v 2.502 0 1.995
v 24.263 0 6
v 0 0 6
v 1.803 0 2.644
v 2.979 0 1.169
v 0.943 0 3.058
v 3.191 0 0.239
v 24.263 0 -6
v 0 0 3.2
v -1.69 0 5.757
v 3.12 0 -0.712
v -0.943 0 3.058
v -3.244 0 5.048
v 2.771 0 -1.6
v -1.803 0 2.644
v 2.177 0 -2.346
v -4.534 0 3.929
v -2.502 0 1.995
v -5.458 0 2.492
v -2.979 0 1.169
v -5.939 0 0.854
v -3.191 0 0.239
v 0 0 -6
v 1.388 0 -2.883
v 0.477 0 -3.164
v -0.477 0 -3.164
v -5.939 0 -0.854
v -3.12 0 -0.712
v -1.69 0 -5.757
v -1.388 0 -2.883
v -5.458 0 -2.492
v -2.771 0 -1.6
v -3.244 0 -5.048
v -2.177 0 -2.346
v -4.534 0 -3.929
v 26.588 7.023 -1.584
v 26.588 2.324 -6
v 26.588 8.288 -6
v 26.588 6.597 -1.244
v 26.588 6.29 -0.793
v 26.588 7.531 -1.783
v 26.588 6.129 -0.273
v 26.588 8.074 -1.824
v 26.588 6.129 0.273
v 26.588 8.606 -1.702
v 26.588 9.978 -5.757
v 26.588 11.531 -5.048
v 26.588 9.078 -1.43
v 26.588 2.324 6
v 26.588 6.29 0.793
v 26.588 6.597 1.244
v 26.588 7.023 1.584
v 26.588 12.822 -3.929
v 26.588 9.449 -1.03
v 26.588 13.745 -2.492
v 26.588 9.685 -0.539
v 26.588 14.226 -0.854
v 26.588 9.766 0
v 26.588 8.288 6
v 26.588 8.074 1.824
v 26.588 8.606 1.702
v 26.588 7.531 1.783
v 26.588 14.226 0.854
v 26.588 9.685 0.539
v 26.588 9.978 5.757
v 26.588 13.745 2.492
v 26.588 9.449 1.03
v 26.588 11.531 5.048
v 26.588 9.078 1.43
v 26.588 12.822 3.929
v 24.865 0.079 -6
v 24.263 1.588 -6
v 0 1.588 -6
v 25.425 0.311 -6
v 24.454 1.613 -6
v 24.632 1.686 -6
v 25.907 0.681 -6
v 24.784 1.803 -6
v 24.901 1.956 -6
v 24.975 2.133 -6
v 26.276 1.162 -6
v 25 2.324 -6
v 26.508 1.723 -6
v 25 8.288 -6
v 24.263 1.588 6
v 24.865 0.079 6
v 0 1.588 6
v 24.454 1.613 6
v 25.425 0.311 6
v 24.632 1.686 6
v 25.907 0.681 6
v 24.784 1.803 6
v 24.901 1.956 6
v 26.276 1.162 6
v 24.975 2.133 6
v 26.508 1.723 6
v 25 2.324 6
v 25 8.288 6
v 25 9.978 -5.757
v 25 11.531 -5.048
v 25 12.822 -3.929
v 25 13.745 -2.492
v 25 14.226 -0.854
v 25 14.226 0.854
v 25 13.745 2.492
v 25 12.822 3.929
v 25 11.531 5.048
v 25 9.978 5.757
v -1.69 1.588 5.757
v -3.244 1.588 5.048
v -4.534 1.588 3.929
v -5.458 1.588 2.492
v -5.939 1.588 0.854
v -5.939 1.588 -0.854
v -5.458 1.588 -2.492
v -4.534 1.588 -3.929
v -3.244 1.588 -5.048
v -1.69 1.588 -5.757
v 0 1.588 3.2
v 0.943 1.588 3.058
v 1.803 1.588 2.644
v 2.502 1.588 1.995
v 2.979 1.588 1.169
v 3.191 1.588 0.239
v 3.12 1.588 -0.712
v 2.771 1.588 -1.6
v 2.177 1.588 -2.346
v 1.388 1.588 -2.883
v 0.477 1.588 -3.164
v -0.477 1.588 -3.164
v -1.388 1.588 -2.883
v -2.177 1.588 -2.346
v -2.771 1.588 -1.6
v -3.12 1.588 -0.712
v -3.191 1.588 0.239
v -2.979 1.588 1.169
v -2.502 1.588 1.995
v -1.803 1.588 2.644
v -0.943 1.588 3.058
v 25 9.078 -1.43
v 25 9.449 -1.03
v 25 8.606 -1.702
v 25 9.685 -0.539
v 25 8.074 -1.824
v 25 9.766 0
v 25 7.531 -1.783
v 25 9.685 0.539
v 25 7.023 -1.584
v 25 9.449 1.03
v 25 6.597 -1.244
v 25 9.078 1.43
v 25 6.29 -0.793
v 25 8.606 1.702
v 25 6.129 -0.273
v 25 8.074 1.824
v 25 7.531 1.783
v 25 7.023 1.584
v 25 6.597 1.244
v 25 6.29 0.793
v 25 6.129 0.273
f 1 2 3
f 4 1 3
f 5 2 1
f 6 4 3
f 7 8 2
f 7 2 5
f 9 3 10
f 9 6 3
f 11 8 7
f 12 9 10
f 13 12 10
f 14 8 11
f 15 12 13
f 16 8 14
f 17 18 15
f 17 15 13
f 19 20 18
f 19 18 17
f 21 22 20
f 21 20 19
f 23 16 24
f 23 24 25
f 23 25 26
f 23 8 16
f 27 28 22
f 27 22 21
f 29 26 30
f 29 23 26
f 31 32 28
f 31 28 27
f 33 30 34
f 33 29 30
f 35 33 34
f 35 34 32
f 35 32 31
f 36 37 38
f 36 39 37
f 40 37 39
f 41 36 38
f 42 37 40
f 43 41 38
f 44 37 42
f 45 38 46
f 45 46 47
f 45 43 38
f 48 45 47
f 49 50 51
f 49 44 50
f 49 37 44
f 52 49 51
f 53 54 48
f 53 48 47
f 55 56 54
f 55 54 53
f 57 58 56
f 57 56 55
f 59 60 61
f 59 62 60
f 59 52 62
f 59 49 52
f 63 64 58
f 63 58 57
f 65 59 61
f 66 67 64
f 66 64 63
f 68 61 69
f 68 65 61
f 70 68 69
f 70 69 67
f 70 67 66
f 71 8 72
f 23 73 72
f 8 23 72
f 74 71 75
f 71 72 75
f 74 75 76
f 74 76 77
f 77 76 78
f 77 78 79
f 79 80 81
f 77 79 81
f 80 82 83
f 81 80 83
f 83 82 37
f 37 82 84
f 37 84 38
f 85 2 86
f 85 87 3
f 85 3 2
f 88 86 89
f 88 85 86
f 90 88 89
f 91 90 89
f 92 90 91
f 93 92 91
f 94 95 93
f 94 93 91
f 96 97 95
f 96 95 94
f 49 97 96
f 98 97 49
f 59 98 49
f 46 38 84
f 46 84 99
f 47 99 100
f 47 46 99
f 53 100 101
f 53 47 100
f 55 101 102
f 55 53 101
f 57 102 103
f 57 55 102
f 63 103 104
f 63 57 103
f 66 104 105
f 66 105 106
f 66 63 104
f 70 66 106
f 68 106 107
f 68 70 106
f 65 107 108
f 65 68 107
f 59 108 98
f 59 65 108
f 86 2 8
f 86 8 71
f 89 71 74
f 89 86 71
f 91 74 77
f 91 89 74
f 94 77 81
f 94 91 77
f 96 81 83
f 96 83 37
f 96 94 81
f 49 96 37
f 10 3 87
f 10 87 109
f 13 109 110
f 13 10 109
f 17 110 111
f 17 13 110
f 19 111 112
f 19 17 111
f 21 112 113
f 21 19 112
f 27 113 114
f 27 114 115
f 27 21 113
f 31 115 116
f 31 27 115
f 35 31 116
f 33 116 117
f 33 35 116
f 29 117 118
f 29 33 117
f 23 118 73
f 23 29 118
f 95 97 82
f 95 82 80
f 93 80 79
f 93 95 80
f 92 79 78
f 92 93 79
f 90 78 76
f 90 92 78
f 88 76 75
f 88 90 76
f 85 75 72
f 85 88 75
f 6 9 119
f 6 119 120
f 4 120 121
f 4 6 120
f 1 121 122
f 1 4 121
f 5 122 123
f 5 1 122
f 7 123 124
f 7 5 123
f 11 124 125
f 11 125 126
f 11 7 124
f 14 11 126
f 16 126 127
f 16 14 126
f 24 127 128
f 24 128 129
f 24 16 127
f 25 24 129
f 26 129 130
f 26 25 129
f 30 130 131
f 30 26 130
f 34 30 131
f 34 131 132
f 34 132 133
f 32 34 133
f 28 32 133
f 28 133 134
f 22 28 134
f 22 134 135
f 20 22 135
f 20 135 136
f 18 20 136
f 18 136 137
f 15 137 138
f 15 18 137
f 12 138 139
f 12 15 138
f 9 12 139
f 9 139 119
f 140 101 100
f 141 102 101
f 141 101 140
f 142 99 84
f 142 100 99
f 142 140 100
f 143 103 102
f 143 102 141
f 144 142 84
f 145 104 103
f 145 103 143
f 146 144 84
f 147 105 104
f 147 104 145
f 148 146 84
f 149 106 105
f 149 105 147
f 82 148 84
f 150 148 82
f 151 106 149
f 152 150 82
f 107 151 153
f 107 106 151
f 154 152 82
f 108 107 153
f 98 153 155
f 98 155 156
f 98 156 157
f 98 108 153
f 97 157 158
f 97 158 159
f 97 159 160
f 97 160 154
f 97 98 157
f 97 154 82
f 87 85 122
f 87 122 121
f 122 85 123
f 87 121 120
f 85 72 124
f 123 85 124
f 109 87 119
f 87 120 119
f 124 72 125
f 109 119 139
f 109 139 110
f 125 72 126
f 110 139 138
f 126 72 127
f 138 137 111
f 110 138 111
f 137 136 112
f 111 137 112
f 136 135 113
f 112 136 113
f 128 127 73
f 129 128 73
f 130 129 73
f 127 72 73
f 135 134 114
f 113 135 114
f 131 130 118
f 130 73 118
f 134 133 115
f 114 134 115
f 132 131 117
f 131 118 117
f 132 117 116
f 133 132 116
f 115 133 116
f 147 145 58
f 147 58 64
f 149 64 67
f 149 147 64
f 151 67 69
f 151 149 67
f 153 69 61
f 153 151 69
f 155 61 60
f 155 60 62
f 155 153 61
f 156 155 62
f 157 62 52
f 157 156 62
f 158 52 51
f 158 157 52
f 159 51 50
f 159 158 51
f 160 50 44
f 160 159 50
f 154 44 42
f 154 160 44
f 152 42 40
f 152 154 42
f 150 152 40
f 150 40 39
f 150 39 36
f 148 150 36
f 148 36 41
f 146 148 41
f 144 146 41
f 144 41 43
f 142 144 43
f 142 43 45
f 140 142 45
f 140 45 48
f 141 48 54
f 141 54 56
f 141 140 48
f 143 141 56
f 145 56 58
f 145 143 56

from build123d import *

# Parameters (mm, degrees)
SKETCH1_R                    = 3.2
BASE_FLANGE1_DEPTH           = 1.5875
EDGE_FLANGE1_STRIP_W         = 7.8232
EDGE_FLANGE1_STRIP_H         = 1.5875
EDGE_FLANGE1_STRIP_CUT_DEPTH = 12
EDGE_FLANGE1_DEPTH           = 12
HOLE1_START                  = 25
HOLE1_OUTLINE_R              = 1.8288
HOLE1_DEPTH                  = 1.5875
FILLET1_RADIUS               = 6
FILLET1_LENGTH               = 1.5875


# Read off the part's stored shape, not the designer's step: Hole1
# Sheet-metal steps are written as plain solids
with BuildPart() as part:
    # Sketch1 → Base-Flange1 (new body)
    with BuildSketch(Plane(origin=(0, 0, 0), x_dir=(1, 0, 0), z_dir=(0, 1, 0))):
        with BuildLine():
            Line((0, 6), (25, 6))
            Line((25, 6), (25, -6))
            Line((25, -6), (0, -6))
            ThreePointArc((0, -6), (-6, 0), (0, 6))
        make_face()
        with Locations(Location((0, 0, 0), (0, 0, 270))):
            Circle(SKETCH1_R, mode=Mode.SUBTRACT)
    extrude(amount=BASE_FLANGE1_DEPTH)

    # Edge-Flange1 strip (across the edge) → Edge-Flange1 strip cut (cut)
    with BuildSketch(Plane(origin=(25, 1.5875, 6), x_dir=(-1, 0, 0), z_dir=(0, 0, -1))):
        with Locations((-3.175, -0.79375)):
            Rectangle(EDGE_FLANGE1_STRIP_W, EDGE_FLANGE1_STRIP_H)
    extrude(amount=EDGE_FLANGE1_STRIP_CUT_DEPTH, mode=Mode.SUBTRACT)

    # Edge-Flange1 section (across the edge) → Edge-Flange1 (add)
    with BuildSketch(Plane(origin=(25, 1.5875, 6), x_dir=(-1, 0, 0), z_dir=(0, 0, -1))):
        with BuildLine():
            Line((-1.5875, 0.7366), (-1.5875, 12.7))
            Line((-1.5875, 12.7), (0, 12.7))
            Line((0, 12.7), (0, 0.7366))
            ThreePointArc((0, 0.7366), (0.215745145, 0.215745145), (0.7366, 0))
            Line((0.7366, 0), (0.7366, -1.5875))
            ThreePointArc((0.7366, -1.5875), (-0.90678687, -0.90678687), (-1.5875, 0.7366))
        make_face()
    extrude(amount=EDGE_FLANGE1_DEPTH)

    # Hole1 outline → Hole1 (cut)
    with BuildSketch(Plane.YZ.offset(HOLE1_START)):
        with Locations((7.9375, 0)):
            Circle(HOLE1_OUTLINE_R)
    extrude(amount=HOLE1_DEPTH, mode=Mode.SUBTRACT)

    # Fillet1: full round fillet: the end face becomes a half cylinder, R = half its width
    fillet1_face = Plane((25.79375, 14.2875, 0), x_dir=(1, 0, 0), z_dir=(0, 1, 0))  # on the end face: x along it, z out of the body
    fillet1_slab = fillet1_face.offset(-FILLET1_RADIUS / 2) * Box(FILLET1_LENGTH, 2 * FILLET1_RADIUS, FILLET1_RADIUS, mode=Mode.PRIVATE)  # the body's end, R deep
    fillet1_round = Plane((25.79375, 8.2875, 0), x_dir=(0, 1, 0), z_dir=(1, 0, 0)) * Cylinder(FILLET1_RADIUS, FILLET1_LENGTH, mode=Mode.PRIVATE)  # its axis R under the face
    add(fillet1_slab - fillet1_round, mode=Mode.SUBTRACT)


solid = part.part
